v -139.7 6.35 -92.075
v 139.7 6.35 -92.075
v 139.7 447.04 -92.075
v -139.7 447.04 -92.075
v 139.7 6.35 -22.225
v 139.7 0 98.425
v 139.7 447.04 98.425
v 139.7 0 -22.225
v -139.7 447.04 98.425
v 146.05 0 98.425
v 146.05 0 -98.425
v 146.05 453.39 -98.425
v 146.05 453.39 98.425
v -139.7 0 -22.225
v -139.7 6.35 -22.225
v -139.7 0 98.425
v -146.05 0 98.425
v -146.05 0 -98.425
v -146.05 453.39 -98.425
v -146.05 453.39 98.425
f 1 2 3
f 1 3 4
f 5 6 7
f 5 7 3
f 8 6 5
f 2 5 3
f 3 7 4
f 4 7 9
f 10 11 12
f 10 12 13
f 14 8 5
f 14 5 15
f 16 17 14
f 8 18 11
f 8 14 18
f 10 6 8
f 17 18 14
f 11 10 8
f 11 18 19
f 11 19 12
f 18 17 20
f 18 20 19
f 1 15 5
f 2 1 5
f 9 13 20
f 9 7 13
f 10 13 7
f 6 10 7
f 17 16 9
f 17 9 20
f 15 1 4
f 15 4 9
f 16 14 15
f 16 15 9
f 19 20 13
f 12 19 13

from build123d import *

# Parameters (mm, degrees)
F0_W     = 50.8
F0_H     = 6.35
F0_W_2   = 177.8
F1_DEPTH = 453.39
F2_DEPTH = 6.35
F3_W     = 292.1
F3_H     = 196.85
F4_DEPTH = 6.35


with BuildPart() as f1:
    # F0 (on Front) → F1 (new body)
    with BuildSketch(Plane.XZ):
        Polygon((-139.7, -92.075), (-139.7, -22.225), (-139.7, 98.425), (-146.05, 98.425), (-146.05, -98.425), (-139.7, -98.425), align=None)
        with Locations((-114.3, -95.25)):
            Rectangle(F0_W, F0_H)
        with Locations((114.3, -95.25)):
            Rectangle(F0_W, F0_H)
        Polygon((146.05, -98.425), (146.05, 98.425), (139.7, 98.425), (139.7, -22.225), (139.7, -92.075), (139.7, -98.425), align=None)
        with Locations((0, -95.25)):
            Rectangle(F0_W_2, F0_H)
    extrude(amount=-F1_DEPTH)

    # F0 (on Front) → F2 (join)
    with BuildSketch(Plane.XZ):
        Polygon((139.7, -92.075), (139.7, -22.225), (-139.7, -22.225), (-139.7, -92.075), (-88.9, -92.075), (88.9, -92.075), align=None)
        with Locations((0, -95.25)):
            Rectangle(F0_W_2, F0_H)
        with Locations((-114.3, -95.25)):
            Rectangle(F0_W, F0_H)
        with Locations((114.3, -95.25)):
            Rectangle(F0_W, F0_H)
    extrude(amount=-F2_DEPTH)

    # F3 (on face) → F4 (join)
    with BuildSketch(Plane(origin=(0, 453.39, 0), x_dir=(-1, 0, 0), z_dir=(0, 1, 0))):
        Rectangle(F3_W, F3_H)
    extrude(amount=-F4_DEPTH)


solid = f1.part
